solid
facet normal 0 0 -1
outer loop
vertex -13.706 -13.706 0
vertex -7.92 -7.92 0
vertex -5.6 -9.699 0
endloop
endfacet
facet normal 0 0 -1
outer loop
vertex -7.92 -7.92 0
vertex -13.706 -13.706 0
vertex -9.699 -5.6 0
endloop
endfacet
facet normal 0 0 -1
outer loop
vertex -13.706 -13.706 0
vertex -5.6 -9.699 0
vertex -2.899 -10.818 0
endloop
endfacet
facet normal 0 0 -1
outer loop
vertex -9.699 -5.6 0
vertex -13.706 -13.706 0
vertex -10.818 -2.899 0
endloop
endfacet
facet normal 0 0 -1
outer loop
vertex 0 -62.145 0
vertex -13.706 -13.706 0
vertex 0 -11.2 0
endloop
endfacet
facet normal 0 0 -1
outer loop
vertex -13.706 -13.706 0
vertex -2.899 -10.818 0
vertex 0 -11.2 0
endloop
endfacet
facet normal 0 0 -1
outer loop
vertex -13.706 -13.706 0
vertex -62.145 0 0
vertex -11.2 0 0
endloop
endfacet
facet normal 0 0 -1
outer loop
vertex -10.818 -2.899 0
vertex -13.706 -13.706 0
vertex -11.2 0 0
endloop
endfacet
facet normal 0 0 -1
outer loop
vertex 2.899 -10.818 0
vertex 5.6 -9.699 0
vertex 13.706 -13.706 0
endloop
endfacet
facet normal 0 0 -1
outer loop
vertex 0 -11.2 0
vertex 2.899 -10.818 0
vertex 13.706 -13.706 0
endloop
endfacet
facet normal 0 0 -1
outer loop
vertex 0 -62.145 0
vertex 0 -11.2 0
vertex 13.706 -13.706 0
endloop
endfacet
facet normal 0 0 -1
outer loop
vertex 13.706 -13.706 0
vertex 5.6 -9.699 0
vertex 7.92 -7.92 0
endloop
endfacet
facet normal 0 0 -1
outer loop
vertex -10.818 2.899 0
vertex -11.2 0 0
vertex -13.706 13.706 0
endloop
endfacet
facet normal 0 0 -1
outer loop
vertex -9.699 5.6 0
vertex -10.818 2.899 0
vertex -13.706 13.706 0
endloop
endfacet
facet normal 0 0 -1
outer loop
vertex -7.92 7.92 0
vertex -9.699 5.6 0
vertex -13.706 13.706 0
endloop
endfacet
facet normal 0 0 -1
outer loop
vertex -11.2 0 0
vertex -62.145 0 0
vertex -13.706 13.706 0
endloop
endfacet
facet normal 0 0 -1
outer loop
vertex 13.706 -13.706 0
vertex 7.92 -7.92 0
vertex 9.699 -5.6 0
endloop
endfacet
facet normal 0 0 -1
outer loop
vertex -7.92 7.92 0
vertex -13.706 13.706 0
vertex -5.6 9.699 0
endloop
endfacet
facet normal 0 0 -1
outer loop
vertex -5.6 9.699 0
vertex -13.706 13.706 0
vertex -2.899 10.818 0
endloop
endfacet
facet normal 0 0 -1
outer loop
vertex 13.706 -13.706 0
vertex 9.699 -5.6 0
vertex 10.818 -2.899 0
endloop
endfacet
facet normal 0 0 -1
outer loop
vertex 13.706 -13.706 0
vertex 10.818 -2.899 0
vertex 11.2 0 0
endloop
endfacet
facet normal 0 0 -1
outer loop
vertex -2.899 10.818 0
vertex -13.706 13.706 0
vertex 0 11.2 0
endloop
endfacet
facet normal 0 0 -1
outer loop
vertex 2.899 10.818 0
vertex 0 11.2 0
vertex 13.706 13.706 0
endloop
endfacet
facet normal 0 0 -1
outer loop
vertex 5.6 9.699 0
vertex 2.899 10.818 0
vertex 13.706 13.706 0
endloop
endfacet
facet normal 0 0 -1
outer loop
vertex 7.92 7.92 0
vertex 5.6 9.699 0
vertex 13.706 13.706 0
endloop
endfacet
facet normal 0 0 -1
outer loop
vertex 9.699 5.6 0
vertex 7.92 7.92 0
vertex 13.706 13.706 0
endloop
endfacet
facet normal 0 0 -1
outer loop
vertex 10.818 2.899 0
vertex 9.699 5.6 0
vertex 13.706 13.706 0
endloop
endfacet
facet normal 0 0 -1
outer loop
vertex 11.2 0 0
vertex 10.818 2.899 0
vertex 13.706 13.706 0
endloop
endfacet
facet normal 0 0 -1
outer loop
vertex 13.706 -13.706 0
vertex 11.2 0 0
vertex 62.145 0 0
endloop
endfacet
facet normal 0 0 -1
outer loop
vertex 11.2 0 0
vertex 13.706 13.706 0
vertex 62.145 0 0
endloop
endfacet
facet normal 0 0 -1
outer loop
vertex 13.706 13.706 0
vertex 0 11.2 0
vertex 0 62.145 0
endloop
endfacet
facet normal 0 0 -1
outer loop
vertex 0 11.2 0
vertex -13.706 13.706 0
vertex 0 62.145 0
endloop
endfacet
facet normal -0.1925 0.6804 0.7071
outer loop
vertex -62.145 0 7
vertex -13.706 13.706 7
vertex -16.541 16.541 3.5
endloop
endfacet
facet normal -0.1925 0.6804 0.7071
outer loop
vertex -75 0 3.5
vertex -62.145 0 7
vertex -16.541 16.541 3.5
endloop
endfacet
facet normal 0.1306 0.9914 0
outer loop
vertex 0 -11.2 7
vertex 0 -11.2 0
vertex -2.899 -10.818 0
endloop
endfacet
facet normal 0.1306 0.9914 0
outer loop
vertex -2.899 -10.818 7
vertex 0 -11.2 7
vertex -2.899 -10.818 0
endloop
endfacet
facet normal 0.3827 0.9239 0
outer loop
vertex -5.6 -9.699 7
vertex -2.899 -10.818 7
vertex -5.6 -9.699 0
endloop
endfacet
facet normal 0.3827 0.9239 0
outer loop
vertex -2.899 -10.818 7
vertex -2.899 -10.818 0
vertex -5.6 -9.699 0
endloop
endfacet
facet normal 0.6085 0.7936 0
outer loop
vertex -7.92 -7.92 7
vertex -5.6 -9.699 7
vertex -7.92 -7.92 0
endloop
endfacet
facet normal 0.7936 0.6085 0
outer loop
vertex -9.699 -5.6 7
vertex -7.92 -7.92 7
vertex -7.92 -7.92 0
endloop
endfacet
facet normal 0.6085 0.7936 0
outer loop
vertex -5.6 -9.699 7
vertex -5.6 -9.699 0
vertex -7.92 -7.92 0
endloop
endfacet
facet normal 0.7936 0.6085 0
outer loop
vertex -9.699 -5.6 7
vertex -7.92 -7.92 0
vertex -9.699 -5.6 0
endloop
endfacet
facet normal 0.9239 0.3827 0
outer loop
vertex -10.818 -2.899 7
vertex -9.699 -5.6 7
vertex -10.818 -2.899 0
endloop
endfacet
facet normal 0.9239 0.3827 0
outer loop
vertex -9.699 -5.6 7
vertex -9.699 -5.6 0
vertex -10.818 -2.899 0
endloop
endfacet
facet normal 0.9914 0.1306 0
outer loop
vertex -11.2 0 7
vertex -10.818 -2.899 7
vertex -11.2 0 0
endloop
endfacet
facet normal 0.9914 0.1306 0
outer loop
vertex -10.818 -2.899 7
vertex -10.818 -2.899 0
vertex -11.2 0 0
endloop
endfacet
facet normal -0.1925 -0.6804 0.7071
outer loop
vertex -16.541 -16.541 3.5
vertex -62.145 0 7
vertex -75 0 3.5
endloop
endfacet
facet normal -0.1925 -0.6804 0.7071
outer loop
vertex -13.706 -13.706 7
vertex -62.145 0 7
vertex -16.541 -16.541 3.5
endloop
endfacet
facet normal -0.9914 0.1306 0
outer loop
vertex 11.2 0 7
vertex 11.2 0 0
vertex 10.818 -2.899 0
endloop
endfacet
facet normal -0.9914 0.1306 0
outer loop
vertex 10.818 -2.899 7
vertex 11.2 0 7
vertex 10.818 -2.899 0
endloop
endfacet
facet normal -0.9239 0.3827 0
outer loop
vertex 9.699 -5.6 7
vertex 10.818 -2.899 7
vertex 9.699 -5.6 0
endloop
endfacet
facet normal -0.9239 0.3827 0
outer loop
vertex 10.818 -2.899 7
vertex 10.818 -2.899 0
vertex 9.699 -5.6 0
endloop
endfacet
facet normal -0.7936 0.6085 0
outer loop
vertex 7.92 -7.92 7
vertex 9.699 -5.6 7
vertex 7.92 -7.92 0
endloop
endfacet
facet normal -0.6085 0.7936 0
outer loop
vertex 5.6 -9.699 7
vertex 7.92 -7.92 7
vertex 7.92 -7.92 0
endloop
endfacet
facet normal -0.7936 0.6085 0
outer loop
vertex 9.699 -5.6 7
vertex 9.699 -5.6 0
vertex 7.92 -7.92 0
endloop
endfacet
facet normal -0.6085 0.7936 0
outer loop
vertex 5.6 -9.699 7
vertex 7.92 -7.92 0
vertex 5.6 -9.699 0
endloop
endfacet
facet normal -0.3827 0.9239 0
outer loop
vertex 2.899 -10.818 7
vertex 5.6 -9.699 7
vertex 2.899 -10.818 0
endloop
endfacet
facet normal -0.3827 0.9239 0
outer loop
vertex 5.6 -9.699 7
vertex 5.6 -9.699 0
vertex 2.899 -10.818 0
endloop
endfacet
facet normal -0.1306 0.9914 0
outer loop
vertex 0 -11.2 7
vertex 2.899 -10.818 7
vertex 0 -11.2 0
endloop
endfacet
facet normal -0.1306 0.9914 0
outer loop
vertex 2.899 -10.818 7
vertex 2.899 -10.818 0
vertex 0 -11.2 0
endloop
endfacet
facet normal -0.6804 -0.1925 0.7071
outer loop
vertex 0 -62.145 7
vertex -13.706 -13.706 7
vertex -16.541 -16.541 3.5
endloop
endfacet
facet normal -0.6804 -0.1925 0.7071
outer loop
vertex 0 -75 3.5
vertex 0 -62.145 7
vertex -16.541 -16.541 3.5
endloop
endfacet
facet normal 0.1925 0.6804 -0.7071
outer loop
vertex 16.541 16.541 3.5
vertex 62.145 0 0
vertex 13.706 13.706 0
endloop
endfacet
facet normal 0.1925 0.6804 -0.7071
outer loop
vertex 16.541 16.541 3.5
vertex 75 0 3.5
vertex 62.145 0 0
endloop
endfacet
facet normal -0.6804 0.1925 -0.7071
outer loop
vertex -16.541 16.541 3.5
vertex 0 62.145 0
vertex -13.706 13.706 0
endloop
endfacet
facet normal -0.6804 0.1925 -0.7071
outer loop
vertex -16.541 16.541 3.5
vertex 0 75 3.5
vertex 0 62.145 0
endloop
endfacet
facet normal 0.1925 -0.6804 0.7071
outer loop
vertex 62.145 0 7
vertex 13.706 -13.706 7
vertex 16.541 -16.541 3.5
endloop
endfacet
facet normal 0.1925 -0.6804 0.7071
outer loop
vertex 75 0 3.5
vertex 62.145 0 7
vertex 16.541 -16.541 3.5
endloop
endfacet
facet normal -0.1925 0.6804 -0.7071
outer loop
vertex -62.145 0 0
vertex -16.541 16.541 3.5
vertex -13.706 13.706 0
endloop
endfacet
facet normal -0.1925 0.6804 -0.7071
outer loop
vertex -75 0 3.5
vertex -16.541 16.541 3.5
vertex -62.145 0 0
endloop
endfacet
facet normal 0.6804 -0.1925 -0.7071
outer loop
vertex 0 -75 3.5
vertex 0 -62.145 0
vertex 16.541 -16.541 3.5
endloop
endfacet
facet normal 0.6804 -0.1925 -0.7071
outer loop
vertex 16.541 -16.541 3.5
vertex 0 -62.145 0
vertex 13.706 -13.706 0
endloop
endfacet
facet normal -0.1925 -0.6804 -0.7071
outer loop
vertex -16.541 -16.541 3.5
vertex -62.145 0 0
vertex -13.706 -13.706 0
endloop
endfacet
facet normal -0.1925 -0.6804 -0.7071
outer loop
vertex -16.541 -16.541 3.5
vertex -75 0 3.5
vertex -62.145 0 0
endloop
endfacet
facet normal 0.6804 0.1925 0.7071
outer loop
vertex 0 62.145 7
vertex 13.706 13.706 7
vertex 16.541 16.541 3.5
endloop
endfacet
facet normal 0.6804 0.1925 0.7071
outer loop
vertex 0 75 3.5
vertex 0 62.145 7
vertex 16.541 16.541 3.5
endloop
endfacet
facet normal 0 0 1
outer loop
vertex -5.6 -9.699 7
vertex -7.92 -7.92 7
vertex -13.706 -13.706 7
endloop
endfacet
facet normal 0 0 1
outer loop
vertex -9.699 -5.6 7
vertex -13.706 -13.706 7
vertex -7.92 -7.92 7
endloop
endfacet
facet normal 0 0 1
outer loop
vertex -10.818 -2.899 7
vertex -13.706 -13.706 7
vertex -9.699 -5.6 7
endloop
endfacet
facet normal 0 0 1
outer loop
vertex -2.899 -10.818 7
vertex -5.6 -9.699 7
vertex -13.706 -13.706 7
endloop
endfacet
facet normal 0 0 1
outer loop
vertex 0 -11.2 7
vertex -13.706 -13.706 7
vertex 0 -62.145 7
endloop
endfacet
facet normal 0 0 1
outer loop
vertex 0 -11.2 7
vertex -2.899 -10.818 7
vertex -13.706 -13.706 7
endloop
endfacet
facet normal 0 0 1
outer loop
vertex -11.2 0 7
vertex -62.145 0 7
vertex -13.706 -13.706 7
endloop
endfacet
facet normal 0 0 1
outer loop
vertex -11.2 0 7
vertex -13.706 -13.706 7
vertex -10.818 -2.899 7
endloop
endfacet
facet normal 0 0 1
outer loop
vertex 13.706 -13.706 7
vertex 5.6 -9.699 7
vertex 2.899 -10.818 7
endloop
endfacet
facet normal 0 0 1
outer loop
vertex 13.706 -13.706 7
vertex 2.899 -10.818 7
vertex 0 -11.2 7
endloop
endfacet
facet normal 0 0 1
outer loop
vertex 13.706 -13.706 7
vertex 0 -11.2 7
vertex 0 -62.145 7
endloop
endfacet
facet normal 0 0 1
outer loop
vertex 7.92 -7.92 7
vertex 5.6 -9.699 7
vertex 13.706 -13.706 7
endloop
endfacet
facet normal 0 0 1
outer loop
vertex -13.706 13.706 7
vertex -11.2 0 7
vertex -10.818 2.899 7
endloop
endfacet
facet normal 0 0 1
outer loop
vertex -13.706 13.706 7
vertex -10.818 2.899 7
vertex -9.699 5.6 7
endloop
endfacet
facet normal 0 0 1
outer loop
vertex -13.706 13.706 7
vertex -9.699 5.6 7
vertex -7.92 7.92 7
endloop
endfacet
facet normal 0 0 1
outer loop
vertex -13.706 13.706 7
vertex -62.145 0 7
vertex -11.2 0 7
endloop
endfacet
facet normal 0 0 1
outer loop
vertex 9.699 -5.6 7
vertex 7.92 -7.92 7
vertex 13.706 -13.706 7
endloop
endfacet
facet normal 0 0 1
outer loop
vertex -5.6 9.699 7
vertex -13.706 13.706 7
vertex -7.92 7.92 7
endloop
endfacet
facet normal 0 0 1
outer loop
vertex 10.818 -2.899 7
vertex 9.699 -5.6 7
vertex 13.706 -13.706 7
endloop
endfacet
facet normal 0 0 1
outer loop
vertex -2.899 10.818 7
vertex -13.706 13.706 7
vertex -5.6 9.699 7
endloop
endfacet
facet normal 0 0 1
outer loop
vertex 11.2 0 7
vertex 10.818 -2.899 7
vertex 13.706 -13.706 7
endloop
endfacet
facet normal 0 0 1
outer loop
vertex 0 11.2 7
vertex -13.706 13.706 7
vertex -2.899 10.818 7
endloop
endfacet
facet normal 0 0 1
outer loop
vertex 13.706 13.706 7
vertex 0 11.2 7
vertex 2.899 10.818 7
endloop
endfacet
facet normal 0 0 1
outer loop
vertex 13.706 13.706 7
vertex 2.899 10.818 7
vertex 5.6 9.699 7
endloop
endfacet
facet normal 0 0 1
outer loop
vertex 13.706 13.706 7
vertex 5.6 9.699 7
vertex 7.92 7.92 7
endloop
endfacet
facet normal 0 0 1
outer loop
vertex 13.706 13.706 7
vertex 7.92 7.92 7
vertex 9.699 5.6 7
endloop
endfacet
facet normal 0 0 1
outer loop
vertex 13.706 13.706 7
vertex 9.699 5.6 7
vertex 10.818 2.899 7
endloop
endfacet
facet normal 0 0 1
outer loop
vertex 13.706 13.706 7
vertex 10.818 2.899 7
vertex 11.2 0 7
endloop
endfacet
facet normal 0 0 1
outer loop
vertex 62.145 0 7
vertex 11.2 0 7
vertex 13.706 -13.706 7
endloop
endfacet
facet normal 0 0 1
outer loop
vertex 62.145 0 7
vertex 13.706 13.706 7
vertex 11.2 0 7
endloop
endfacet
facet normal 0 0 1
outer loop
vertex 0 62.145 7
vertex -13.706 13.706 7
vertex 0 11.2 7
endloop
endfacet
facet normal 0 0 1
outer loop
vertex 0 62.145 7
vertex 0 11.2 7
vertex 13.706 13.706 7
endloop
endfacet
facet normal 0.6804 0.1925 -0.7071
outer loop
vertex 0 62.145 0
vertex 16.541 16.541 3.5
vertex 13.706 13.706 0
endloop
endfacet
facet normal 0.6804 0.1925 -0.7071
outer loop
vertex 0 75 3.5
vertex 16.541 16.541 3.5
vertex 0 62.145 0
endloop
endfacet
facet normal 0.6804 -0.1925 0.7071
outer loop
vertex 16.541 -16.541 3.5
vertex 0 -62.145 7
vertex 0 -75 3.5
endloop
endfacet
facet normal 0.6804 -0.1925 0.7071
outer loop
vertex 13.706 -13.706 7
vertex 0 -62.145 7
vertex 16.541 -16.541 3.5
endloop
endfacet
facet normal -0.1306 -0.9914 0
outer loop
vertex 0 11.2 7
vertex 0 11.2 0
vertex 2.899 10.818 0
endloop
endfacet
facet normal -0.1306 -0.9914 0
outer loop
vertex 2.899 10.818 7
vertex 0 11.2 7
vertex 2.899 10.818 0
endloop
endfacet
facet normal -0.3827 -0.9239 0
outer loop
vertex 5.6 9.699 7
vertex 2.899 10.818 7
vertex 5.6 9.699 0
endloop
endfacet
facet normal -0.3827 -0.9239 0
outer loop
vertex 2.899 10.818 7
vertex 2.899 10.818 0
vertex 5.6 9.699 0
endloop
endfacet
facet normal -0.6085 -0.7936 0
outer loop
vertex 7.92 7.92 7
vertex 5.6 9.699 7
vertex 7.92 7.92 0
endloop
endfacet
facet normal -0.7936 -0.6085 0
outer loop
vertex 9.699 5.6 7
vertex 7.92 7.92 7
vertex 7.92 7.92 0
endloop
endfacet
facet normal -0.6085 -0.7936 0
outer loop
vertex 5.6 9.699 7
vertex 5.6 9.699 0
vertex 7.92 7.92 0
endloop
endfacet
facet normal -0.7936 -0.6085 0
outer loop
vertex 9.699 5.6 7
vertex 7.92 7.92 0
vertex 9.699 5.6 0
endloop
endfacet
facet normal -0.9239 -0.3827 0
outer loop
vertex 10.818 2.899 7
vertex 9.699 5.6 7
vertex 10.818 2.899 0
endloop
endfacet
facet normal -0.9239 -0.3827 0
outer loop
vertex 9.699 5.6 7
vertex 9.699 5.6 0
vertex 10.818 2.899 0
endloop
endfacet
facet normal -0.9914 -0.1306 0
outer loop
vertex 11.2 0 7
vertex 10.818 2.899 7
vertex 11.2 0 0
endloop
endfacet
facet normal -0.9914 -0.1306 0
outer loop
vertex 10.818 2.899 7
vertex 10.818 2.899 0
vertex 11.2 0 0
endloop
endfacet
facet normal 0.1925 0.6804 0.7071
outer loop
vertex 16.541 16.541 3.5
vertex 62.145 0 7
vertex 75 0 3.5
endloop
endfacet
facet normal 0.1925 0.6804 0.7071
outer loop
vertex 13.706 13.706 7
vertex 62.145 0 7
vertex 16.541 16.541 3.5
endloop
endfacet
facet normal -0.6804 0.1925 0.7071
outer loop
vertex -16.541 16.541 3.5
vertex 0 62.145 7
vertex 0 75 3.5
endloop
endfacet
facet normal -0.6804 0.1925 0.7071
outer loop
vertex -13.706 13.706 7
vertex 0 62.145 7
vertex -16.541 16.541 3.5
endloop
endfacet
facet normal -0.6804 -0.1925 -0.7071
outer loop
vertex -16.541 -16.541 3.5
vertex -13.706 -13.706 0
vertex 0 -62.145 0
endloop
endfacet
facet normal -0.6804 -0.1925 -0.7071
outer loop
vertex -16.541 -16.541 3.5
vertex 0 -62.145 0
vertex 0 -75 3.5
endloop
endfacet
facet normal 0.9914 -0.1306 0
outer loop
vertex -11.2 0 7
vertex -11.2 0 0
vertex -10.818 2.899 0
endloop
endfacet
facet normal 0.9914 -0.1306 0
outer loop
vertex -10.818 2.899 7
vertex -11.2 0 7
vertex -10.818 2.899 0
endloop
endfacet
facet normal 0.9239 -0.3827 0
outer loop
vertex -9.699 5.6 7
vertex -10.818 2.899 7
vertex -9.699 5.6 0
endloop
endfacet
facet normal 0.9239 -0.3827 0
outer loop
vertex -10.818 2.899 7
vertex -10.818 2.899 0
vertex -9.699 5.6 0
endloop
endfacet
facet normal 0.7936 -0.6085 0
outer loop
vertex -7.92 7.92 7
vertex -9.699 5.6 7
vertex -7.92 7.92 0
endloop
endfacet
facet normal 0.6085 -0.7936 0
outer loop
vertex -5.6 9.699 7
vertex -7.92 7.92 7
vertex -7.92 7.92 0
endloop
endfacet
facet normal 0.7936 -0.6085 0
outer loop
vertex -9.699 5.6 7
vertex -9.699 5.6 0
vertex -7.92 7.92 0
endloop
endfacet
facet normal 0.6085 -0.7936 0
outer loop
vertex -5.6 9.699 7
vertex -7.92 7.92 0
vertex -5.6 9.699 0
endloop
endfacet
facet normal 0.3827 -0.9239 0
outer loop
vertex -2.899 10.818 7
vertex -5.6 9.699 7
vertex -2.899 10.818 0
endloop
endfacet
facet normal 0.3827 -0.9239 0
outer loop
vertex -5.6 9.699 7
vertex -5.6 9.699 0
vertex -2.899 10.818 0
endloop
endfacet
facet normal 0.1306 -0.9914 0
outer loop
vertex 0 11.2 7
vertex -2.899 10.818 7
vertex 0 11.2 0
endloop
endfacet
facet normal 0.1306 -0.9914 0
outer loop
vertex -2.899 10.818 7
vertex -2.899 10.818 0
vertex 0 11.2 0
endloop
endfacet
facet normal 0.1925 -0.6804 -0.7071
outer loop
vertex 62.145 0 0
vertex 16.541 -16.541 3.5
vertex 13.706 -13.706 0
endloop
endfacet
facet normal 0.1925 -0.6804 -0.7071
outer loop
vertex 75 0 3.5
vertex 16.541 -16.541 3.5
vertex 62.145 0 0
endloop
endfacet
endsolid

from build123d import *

# Parameters (mm, degrees)
F1_DEPTH = 7
F2_SIZE  = 3.5
F3_SIZE  = 3.49999


# Not quite as in the source:
# - a fillet or chamfer is up to 0.001 mm smaller than in the source, because OpenCascade refuses the exact size


with BuildPart() as f1:
    # F0 (on Top) → F1 (new body)
    with BuildSketch(Plane.XY):
        with BuildLine():
            ThreePointArc((-11.2, 0), (-7.9195959493, 7.9195959493), (0, 11.2))
            Line((0, 11.2), (0, 74.9999731779))
            Line((0, 74.9999731779), (-16.5413403588, 16.5413743234))
            Line((-16.5413403588, 16.5413743234), (-74.9999731779, 0))
            Line((-74.9999731779, 0), (-11.2, 0))
        make_face()
        with BuildLine():
            ThreePointArc((0, 11.2), (7.9195959493, 7.9195959493), (11.2, 0))
            Line((11.2, 0), (74.9999433756, 0))
            Line((74.9999433756, 0), (16.5414082881, 16.5413743234))
            Line((16.5414082881, 16.5413743234), (0, 74.9999731779))
            Line((0, 74.9999731779), (0, 11.2))
        make_face()
        with BuildLine():
            Line((74.9999433756, 0), (11.2, 0))
            ThreePointArc((11.2, 0), (7.9195959493, -7.9195959493), (0, -11.2))
            Line((0, -11.2), (0, -74.9999433756))
            Line((0, -74.9999433756), (16.5412724298, -16.5413063943))
            Line((16.5412724298, -16.5413063943), (74.9999433756, 0))
        make_face()
        with BuildLine():
            Line((0, -74.9999433756), (0, -11.2))
            ThreePointArc((0, -11.2), (-7.9195959493, -7.9195959493), (-11.2, 0))
            Line((-11.2, 0), (-74.9999731779, 0))
            Line((-74.9999731779, 0), (-16.5413403588, -16.5413063943))
            Line((-16.5413403588, -16.5413063943), (0, -74.9999433756))
        make_face()
    extrude(amount=F1_DEPTH)

    # F2
    f2_edges = [f1.edges().sort_by_distance(p)[0] for p in [
        (-45.770657, -8.270653, 7),
        (-8.27067, -45.770625, 7),
        (8.270636, -45.770625, 7),
        (45.770608, -8.270653, 7),
        (45.770676, 8.270687, 7),
        (8.270704, 45.770674, 7),
        (-8.27067, 45.770674, 7),
        (-45.770657, 8.270687, 7),
    ]]
    chamfer(f2_edges, length=F2_SIZE)

    # F3 (size 3.5 in the source; OpenCascade refuses exactly that, so slightly less here)
    f3_edges = [f1.edges().sort_by_distance(p)[0] for p in [
        (-45.770657, -8.270653, 0),
        (-45.770657, 8.270687, 0),
        (-8.27067, 45.770674, 0),
        (8.270704, 45.770674, 0),
        (45.770676, 8.270687, 0),
        (45.770608, -8.270653, 0),
        (8.270636, -45.770625, 0),
        (-8.27067, -45.770625, 0),
    ]]
    chamfer(f3_edges, length=F3_SIZE)


solid = f1.part
